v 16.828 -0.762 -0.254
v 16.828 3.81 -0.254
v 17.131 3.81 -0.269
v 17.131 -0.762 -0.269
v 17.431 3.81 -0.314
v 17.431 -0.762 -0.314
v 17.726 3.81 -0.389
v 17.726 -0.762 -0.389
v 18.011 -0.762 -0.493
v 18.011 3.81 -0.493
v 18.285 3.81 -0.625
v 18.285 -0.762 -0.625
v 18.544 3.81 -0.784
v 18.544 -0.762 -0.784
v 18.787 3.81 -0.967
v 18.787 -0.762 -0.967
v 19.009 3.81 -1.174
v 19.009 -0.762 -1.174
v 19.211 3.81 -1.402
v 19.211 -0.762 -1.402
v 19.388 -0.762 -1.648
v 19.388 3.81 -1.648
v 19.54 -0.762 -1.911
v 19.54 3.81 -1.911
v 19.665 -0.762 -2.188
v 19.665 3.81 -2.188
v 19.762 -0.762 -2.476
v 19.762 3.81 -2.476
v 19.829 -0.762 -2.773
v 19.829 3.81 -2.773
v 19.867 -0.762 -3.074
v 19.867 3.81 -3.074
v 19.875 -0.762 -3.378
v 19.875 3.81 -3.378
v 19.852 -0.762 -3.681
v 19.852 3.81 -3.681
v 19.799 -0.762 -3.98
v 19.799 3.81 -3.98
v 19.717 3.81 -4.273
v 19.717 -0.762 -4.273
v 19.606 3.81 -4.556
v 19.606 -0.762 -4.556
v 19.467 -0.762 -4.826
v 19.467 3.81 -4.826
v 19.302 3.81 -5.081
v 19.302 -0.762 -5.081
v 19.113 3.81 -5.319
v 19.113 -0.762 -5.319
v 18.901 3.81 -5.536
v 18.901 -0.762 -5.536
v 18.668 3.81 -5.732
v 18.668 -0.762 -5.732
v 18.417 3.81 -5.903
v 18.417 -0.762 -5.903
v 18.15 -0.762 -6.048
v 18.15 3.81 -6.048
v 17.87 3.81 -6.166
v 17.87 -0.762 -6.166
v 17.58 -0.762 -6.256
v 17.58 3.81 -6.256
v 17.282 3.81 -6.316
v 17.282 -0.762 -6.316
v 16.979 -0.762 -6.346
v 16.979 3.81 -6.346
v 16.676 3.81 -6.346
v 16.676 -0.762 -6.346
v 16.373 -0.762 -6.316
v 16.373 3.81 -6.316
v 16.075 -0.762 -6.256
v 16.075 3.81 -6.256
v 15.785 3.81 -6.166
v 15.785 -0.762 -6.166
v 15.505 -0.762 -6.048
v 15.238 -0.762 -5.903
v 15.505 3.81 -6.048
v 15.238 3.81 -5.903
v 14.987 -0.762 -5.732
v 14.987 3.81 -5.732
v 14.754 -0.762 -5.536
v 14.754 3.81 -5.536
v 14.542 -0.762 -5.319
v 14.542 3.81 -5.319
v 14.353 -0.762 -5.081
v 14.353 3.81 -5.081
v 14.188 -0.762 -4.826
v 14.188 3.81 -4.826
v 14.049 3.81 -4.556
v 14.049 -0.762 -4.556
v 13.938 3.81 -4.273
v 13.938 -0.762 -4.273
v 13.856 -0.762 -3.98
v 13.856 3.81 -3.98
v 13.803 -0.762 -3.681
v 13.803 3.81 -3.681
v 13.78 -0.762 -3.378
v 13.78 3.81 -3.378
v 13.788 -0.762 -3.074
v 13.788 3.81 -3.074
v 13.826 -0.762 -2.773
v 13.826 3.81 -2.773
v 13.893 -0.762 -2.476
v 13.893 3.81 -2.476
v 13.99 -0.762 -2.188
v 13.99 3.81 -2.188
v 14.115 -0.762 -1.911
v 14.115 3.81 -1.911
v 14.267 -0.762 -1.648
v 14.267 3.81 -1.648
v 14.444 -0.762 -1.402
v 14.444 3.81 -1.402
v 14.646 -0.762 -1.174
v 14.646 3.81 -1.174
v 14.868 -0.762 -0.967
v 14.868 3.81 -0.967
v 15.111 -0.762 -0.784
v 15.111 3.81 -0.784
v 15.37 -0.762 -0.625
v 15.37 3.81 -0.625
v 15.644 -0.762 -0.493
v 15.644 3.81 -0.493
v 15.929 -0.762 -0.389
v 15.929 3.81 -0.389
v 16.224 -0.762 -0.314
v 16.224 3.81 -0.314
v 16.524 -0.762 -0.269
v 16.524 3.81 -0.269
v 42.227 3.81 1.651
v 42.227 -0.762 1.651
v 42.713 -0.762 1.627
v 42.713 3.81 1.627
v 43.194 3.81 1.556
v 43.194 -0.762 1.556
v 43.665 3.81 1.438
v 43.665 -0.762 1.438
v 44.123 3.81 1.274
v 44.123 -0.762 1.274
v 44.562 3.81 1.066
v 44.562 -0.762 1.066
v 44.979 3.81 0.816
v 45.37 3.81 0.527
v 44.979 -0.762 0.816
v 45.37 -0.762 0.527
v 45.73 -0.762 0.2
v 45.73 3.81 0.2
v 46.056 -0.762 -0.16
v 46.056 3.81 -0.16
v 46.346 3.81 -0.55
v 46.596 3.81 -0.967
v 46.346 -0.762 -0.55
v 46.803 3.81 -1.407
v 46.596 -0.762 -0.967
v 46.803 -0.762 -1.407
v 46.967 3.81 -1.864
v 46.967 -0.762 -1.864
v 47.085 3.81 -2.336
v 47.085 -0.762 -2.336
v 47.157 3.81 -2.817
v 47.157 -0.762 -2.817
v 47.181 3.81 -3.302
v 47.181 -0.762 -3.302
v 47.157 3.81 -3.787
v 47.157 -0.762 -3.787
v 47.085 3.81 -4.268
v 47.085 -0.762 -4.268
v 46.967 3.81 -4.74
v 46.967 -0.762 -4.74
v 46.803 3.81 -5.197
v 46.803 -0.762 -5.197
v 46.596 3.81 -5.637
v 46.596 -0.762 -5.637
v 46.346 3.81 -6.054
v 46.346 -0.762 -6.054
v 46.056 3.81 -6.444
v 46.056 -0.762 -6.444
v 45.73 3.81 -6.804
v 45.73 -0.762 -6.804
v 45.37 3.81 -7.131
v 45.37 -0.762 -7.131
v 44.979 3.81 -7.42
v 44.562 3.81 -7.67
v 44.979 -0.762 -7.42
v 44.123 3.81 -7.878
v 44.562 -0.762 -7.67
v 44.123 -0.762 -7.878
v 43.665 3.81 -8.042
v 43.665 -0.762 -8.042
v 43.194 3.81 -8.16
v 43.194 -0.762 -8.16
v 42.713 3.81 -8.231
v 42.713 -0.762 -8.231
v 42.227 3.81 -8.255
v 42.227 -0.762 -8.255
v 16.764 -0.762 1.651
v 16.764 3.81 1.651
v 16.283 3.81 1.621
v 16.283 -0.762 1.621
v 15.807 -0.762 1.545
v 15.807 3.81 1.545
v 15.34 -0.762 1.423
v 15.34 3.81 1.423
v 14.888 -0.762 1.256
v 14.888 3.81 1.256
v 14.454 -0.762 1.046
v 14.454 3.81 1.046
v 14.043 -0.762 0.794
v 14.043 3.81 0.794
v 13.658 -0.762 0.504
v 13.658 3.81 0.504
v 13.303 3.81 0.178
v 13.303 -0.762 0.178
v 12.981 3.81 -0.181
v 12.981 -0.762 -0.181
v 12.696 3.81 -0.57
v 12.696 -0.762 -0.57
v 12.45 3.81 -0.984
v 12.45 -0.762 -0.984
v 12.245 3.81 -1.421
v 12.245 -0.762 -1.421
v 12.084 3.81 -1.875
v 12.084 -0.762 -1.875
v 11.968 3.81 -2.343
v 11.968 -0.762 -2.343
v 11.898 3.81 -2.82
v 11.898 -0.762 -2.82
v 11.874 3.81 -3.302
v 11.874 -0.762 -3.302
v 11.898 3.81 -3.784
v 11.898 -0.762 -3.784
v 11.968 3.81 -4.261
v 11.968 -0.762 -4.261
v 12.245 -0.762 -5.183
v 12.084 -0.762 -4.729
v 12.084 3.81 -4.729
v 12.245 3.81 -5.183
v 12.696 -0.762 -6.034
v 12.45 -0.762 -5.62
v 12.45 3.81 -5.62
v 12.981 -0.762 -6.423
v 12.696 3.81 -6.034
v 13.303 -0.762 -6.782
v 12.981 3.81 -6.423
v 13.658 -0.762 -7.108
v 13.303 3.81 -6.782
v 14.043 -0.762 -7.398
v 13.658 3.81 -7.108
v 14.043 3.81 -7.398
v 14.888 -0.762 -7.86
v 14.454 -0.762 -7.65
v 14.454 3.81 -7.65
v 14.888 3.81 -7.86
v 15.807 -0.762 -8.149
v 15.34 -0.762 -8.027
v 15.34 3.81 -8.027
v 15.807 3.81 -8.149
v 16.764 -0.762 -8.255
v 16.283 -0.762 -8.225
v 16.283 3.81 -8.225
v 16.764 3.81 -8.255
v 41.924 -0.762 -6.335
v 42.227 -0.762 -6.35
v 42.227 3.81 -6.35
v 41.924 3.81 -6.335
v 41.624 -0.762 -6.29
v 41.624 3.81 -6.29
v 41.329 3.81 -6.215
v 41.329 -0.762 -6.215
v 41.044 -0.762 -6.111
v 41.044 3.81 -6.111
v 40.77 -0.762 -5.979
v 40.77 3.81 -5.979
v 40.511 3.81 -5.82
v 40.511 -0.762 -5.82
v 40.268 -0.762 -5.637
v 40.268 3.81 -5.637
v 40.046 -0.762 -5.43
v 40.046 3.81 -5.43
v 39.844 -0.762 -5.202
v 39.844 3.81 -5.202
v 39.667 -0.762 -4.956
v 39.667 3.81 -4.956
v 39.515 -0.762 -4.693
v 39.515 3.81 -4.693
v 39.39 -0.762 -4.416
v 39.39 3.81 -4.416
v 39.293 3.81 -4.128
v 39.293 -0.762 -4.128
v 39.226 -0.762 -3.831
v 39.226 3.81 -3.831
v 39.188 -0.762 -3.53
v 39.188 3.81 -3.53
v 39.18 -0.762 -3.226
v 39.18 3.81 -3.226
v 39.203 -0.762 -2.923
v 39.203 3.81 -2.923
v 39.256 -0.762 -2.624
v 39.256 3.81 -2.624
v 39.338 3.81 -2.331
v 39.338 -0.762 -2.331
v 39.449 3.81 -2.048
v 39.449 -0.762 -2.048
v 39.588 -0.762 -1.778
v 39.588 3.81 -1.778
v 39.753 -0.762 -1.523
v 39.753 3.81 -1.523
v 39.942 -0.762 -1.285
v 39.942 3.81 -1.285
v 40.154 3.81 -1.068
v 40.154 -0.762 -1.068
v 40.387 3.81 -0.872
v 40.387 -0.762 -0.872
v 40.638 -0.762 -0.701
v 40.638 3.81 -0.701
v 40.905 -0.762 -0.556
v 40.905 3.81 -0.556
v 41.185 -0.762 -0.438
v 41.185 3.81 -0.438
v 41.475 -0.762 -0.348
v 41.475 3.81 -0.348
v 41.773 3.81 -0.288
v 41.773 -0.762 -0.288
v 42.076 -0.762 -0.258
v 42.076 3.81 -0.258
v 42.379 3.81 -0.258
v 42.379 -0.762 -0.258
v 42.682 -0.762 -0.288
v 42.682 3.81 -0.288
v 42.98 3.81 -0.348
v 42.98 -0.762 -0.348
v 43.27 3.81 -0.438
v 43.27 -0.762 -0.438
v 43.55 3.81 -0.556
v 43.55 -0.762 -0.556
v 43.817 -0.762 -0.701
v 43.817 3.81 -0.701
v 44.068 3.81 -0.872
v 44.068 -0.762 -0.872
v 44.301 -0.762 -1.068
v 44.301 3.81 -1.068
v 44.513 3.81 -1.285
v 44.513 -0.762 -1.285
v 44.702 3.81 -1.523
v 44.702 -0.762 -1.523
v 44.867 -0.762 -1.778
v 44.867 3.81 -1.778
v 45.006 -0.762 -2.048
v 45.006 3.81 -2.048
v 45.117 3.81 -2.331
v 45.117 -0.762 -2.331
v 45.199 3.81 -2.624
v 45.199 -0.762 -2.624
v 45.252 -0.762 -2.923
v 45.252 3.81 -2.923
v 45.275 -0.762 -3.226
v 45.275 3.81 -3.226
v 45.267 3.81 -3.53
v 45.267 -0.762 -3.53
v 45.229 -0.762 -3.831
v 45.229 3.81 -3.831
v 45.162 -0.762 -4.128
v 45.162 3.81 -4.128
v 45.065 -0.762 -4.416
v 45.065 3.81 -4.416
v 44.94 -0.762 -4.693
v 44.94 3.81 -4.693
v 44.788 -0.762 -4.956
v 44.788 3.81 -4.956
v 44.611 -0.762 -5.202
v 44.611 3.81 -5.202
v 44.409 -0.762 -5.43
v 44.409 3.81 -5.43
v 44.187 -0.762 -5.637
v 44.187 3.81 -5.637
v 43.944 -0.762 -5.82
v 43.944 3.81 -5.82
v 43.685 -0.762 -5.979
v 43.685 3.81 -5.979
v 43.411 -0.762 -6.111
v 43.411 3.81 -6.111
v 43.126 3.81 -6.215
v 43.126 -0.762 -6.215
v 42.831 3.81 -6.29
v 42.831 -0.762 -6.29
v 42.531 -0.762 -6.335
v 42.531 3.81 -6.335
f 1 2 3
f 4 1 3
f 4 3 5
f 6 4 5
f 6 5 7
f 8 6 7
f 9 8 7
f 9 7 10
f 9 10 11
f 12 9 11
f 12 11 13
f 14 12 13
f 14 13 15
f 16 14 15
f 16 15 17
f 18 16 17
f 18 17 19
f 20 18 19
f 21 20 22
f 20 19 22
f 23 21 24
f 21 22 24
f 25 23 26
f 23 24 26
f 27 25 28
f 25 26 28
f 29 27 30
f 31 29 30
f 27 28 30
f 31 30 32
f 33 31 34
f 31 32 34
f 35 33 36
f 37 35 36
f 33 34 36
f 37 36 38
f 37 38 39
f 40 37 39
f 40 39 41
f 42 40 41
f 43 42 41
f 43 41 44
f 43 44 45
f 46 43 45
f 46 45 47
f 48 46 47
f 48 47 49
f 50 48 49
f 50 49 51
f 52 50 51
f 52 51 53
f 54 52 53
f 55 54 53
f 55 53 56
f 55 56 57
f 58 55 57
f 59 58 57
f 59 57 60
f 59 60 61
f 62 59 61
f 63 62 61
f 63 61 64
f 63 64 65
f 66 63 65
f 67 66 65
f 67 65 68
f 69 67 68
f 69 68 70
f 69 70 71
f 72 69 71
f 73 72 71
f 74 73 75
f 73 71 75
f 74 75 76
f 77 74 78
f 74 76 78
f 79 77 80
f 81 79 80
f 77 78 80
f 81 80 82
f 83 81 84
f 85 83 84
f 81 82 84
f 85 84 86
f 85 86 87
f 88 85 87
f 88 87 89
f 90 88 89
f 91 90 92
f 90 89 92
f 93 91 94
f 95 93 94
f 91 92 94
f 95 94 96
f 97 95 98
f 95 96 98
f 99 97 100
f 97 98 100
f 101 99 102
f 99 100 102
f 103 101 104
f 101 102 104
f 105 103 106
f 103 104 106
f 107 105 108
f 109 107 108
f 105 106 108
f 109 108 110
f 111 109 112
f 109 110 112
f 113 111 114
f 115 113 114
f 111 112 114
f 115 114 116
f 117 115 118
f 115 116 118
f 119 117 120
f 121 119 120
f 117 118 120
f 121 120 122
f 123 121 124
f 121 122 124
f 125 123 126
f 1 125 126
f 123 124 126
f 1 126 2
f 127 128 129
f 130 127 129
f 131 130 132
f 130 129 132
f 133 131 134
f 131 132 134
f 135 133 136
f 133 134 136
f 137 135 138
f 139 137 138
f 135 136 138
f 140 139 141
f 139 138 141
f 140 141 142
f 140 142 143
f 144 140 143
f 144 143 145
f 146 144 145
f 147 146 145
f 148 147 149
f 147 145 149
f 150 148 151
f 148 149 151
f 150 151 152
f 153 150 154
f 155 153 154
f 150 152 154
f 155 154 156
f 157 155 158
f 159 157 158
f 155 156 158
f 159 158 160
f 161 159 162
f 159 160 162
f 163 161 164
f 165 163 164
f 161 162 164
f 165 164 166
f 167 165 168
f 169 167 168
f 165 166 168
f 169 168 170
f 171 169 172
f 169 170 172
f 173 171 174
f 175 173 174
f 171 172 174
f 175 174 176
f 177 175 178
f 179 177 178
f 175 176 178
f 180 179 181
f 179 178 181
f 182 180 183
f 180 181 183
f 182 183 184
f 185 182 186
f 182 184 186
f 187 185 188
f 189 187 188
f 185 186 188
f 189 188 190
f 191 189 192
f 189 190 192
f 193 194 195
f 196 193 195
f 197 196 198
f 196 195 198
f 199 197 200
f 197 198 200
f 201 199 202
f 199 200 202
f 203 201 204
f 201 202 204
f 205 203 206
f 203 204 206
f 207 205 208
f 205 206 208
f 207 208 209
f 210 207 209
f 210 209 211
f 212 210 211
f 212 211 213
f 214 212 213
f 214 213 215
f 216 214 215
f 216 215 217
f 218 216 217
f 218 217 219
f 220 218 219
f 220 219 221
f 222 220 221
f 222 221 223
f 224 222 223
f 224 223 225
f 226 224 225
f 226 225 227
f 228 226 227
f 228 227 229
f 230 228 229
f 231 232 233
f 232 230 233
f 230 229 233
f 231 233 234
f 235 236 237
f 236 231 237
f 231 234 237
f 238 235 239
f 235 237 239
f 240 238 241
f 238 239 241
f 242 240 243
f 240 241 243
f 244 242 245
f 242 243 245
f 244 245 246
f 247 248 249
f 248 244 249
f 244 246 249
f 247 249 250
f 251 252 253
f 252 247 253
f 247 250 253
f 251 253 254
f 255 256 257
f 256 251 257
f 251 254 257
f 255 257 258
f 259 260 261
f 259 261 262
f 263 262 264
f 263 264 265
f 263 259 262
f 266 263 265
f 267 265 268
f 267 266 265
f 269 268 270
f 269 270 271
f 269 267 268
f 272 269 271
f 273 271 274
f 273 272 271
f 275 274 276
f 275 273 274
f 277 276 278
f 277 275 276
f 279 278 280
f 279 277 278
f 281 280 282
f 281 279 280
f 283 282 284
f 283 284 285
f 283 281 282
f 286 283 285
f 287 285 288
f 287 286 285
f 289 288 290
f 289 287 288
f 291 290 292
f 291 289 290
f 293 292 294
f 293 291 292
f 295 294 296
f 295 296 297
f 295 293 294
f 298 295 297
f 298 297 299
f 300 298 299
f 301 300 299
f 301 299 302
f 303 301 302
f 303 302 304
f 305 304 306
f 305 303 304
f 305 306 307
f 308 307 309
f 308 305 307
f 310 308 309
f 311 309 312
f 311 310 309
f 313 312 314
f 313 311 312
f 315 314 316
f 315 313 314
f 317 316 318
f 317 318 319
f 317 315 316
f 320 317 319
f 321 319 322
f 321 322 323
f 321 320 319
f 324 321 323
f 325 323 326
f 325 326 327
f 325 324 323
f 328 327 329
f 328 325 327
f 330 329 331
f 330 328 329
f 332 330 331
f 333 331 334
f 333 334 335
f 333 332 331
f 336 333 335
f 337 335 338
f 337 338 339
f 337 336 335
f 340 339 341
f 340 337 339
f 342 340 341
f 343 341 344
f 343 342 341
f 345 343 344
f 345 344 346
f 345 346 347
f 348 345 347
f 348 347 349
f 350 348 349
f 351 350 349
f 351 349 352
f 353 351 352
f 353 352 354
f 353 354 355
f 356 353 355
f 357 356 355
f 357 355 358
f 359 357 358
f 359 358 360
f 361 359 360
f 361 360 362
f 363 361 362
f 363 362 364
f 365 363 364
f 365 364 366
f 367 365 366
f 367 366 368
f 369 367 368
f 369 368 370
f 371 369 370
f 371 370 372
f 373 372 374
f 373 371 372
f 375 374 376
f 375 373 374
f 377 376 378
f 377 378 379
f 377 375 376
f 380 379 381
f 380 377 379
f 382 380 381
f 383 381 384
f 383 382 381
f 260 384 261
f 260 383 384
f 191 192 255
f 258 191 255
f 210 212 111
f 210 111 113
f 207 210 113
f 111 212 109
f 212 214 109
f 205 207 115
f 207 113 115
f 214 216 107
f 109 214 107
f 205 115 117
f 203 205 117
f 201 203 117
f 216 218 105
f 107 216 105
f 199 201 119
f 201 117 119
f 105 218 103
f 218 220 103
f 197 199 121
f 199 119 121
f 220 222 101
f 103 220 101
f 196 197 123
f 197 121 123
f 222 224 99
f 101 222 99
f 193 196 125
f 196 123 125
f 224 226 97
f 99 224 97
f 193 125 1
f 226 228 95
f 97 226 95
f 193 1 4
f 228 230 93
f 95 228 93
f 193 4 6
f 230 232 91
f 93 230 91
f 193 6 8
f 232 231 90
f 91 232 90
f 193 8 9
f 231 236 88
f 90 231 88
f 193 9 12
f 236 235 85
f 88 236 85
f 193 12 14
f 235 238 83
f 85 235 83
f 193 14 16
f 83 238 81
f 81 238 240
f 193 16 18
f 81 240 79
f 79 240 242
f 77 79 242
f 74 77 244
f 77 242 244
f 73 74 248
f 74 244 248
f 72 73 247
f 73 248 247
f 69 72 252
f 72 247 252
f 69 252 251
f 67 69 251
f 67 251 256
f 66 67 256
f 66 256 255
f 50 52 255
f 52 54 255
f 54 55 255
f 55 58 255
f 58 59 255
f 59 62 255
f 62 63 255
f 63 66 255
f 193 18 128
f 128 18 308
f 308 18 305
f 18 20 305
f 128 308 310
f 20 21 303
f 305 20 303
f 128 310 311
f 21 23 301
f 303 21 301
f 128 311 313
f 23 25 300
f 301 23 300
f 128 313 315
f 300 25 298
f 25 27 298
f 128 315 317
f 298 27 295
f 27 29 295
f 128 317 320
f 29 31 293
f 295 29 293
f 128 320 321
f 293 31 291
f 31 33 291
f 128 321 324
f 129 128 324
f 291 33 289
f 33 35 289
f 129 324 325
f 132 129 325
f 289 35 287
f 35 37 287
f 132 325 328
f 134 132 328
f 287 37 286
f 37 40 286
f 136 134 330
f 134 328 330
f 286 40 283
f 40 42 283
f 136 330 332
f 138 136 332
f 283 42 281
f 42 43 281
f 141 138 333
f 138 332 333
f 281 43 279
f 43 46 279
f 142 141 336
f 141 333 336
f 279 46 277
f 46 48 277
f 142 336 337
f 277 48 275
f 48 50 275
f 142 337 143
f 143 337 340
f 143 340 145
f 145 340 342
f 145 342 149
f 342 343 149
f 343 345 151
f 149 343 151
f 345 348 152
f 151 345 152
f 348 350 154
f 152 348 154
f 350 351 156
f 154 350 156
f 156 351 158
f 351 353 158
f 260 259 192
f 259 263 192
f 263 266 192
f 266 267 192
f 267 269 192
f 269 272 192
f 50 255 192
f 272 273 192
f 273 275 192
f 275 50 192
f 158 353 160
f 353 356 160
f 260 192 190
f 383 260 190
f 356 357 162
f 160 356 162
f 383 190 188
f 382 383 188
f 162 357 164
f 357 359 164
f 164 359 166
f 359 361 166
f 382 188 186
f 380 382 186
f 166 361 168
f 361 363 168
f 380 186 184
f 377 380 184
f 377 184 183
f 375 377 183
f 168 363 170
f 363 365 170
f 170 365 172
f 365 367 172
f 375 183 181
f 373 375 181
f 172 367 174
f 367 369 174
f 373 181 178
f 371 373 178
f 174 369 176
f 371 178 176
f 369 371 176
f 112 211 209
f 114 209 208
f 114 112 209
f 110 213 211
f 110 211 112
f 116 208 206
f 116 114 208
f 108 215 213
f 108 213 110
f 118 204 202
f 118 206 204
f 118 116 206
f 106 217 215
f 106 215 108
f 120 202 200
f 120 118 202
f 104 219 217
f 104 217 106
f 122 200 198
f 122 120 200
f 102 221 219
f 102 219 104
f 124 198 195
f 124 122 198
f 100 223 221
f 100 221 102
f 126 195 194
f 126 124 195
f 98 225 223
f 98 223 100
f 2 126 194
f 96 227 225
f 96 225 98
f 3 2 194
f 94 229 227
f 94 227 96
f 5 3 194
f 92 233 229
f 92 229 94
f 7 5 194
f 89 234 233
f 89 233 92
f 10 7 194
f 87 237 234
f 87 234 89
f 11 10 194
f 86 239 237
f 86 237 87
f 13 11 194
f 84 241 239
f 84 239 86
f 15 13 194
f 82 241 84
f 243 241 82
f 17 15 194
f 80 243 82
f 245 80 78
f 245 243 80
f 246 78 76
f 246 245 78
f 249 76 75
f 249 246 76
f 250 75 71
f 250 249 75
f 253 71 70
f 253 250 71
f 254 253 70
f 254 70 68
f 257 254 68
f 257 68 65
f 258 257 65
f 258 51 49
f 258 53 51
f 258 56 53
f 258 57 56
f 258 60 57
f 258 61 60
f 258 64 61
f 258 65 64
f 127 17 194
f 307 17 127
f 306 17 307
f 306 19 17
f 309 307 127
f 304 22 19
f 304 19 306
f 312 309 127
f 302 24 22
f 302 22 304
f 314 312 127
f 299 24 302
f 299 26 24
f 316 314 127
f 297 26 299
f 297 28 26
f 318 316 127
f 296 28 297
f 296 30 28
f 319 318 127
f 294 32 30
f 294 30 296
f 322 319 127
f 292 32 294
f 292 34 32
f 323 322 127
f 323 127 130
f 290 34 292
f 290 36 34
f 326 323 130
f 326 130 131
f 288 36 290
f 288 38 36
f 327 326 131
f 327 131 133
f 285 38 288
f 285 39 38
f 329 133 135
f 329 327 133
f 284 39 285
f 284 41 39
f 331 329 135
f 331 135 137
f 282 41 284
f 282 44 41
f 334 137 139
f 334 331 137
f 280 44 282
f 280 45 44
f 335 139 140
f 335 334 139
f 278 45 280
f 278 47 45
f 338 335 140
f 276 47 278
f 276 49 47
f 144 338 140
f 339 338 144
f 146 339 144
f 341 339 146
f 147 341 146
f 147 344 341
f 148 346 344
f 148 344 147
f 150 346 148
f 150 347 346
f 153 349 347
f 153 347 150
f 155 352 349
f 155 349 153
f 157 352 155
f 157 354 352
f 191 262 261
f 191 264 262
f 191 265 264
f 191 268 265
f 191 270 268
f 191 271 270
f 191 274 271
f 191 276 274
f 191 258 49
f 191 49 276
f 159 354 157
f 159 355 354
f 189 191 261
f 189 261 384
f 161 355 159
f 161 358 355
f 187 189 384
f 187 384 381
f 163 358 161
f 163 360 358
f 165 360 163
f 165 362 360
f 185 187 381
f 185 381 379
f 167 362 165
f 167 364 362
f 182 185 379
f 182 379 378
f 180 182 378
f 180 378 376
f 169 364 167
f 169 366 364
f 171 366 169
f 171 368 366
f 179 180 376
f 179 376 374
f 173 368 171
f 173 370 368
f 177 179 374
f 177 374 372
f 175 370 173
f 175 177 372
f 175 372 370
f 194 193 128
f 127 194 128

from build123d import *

# Parameters (mm, degrees)
ESQUISSE1_R             = 2.032
BOSS_EXTRU_1_DEPTH      = 3.048
ECHELLE1_SCALE          = 1.5
ESQUISSE2_R             = 3.048
ENL_V_MAT_EXTRU_1_DEPTH = 49.114943513
ESQUISSE3_R             = 3.048
ENL_V_MAT_EXTRU_2_DEPTH = 49.114943513


with BuildPart() as part:
    # Esquisse1 → Boss.-Extru.1 (new body)
    with BuildSketch(Plane(origin=(0, 0, 0), x_dir=(1, 0, 0), z_dir=(0, 1, 0))):
        with BuildLine():
            Line((0, 0), (33.782, 0))
            ThreePointArc((33.782, 0), (37.084, 3.302), (33.782, 6.604))
            Line((33.782, 6.604), (0, 6.604))
            ThreePointArc((0, 6.604), (-3.302, 3.302), (0, 0))
        make_face()
        with Locations(Location((0, 3.302, 0), (0, 0, 90))):
            Circle(ESQUISSE1_R, mode=Mode.SUBTRACT)
        with Locations(Location((33.782, 3.302, 0), (0, 0, 90))):
            Circle(ESQUISSE1_R, mode=Mode.SUBTRACT)
    extrude(amount=BOSS_EXTRU_1_DEPTH)


with BuildPart() as part_1:
    # Echelle1: scaled about (16.891, 1.524, -3.302)
    add(part.part.scale(ECHELLE1_SCALE).moved(Location((-8.4455, -0.762, 1.651))))

    # Esquisse2 → Enlèv. mat.-Extru.1 (cut, through all)
    with BuildSketch(Plane(origin=(0, 3.81, 0), x_dir=(1, 0, 0), z_dir=(0, 1, 0))):
        with Locations(Location((16.8275, 3.302, 0), (0, 0, 270))):
            Circle(ESQUISSE2_R)
    extrude(amount=-ENL_V_MAT_EXTRU_1_DEPTH, mode=Mode.SUBTRACT)

    # Esquisse3 → Enlèv. mat.-Extru.2 (cut, through all)
    # profile 1 of 3: a face of its own
    with BuildSketch(Plane(origin=(0, 3.81, 0), x_dir=(1, 0, 0), z_dir=(0, 1, 0))):
        with BuildLine():
            ThreePointArc((-13.3985, 3.301999981), (-11.947799894, 6.804299881), (-8.4455, 8.255))
            Line((-8.4455, 8.255), (-13.3985, 8.255))
            Line((-13.3985, 8.255), (-13.3985, 3.301999981))
        make_face()
    # profile 2 of 3: a face of its own
    with BuildSketch(Plane(origin=(0, 3.81, 0), x_dir=(1, 0, 0), z_dir=(0, 1, 0))):
        with BuildLine():
            ThreePointArc((-8.4455, -1.651), (-11.947799881, -0.200299894), (-13.3985, 3.301999981))
            Line((-13.3985, 3.301999981), (-13.3985, -1.651))
            Line((-13.3985, -1.651), (-8.4455, -1.651))
        make_face()
    # profile 3 of 3: a face of its own
    with BuildSketch(Plane(origin=(0, 3.81, 0), x_dir=(1, 0, 0), z_dir=(0, 1, 0))):
        with BuildLine():
            Line((16.764, 8.255), (-8.4455, 8.255))
            ThreePointArc((-8.4455, 8.255), (-11.947799894, 6.804299881), (-13.3985, 3.301999981))
            ThreePointArc((-13.3985, 3.301999981), (-11.947799881, -0.200299894), (-8.4455, -1.651))
            Line((-8.4455, -1.651), (16.764, -1.651))
            ThreePointArc((16.764, -1.651), (11.874092965, 3.302), (16.764, 8.255))
        make_face()
        with Locations((-8.4455, 3.302)):
            Circle(ESQUISSE3_R, mode=Mode.SUBTRACT)
    extrude(amount=-ENL_V_MAT_EXTRU_2_DEPTH, mode=Mode.SUBTRACT)


solid = part_1.part
